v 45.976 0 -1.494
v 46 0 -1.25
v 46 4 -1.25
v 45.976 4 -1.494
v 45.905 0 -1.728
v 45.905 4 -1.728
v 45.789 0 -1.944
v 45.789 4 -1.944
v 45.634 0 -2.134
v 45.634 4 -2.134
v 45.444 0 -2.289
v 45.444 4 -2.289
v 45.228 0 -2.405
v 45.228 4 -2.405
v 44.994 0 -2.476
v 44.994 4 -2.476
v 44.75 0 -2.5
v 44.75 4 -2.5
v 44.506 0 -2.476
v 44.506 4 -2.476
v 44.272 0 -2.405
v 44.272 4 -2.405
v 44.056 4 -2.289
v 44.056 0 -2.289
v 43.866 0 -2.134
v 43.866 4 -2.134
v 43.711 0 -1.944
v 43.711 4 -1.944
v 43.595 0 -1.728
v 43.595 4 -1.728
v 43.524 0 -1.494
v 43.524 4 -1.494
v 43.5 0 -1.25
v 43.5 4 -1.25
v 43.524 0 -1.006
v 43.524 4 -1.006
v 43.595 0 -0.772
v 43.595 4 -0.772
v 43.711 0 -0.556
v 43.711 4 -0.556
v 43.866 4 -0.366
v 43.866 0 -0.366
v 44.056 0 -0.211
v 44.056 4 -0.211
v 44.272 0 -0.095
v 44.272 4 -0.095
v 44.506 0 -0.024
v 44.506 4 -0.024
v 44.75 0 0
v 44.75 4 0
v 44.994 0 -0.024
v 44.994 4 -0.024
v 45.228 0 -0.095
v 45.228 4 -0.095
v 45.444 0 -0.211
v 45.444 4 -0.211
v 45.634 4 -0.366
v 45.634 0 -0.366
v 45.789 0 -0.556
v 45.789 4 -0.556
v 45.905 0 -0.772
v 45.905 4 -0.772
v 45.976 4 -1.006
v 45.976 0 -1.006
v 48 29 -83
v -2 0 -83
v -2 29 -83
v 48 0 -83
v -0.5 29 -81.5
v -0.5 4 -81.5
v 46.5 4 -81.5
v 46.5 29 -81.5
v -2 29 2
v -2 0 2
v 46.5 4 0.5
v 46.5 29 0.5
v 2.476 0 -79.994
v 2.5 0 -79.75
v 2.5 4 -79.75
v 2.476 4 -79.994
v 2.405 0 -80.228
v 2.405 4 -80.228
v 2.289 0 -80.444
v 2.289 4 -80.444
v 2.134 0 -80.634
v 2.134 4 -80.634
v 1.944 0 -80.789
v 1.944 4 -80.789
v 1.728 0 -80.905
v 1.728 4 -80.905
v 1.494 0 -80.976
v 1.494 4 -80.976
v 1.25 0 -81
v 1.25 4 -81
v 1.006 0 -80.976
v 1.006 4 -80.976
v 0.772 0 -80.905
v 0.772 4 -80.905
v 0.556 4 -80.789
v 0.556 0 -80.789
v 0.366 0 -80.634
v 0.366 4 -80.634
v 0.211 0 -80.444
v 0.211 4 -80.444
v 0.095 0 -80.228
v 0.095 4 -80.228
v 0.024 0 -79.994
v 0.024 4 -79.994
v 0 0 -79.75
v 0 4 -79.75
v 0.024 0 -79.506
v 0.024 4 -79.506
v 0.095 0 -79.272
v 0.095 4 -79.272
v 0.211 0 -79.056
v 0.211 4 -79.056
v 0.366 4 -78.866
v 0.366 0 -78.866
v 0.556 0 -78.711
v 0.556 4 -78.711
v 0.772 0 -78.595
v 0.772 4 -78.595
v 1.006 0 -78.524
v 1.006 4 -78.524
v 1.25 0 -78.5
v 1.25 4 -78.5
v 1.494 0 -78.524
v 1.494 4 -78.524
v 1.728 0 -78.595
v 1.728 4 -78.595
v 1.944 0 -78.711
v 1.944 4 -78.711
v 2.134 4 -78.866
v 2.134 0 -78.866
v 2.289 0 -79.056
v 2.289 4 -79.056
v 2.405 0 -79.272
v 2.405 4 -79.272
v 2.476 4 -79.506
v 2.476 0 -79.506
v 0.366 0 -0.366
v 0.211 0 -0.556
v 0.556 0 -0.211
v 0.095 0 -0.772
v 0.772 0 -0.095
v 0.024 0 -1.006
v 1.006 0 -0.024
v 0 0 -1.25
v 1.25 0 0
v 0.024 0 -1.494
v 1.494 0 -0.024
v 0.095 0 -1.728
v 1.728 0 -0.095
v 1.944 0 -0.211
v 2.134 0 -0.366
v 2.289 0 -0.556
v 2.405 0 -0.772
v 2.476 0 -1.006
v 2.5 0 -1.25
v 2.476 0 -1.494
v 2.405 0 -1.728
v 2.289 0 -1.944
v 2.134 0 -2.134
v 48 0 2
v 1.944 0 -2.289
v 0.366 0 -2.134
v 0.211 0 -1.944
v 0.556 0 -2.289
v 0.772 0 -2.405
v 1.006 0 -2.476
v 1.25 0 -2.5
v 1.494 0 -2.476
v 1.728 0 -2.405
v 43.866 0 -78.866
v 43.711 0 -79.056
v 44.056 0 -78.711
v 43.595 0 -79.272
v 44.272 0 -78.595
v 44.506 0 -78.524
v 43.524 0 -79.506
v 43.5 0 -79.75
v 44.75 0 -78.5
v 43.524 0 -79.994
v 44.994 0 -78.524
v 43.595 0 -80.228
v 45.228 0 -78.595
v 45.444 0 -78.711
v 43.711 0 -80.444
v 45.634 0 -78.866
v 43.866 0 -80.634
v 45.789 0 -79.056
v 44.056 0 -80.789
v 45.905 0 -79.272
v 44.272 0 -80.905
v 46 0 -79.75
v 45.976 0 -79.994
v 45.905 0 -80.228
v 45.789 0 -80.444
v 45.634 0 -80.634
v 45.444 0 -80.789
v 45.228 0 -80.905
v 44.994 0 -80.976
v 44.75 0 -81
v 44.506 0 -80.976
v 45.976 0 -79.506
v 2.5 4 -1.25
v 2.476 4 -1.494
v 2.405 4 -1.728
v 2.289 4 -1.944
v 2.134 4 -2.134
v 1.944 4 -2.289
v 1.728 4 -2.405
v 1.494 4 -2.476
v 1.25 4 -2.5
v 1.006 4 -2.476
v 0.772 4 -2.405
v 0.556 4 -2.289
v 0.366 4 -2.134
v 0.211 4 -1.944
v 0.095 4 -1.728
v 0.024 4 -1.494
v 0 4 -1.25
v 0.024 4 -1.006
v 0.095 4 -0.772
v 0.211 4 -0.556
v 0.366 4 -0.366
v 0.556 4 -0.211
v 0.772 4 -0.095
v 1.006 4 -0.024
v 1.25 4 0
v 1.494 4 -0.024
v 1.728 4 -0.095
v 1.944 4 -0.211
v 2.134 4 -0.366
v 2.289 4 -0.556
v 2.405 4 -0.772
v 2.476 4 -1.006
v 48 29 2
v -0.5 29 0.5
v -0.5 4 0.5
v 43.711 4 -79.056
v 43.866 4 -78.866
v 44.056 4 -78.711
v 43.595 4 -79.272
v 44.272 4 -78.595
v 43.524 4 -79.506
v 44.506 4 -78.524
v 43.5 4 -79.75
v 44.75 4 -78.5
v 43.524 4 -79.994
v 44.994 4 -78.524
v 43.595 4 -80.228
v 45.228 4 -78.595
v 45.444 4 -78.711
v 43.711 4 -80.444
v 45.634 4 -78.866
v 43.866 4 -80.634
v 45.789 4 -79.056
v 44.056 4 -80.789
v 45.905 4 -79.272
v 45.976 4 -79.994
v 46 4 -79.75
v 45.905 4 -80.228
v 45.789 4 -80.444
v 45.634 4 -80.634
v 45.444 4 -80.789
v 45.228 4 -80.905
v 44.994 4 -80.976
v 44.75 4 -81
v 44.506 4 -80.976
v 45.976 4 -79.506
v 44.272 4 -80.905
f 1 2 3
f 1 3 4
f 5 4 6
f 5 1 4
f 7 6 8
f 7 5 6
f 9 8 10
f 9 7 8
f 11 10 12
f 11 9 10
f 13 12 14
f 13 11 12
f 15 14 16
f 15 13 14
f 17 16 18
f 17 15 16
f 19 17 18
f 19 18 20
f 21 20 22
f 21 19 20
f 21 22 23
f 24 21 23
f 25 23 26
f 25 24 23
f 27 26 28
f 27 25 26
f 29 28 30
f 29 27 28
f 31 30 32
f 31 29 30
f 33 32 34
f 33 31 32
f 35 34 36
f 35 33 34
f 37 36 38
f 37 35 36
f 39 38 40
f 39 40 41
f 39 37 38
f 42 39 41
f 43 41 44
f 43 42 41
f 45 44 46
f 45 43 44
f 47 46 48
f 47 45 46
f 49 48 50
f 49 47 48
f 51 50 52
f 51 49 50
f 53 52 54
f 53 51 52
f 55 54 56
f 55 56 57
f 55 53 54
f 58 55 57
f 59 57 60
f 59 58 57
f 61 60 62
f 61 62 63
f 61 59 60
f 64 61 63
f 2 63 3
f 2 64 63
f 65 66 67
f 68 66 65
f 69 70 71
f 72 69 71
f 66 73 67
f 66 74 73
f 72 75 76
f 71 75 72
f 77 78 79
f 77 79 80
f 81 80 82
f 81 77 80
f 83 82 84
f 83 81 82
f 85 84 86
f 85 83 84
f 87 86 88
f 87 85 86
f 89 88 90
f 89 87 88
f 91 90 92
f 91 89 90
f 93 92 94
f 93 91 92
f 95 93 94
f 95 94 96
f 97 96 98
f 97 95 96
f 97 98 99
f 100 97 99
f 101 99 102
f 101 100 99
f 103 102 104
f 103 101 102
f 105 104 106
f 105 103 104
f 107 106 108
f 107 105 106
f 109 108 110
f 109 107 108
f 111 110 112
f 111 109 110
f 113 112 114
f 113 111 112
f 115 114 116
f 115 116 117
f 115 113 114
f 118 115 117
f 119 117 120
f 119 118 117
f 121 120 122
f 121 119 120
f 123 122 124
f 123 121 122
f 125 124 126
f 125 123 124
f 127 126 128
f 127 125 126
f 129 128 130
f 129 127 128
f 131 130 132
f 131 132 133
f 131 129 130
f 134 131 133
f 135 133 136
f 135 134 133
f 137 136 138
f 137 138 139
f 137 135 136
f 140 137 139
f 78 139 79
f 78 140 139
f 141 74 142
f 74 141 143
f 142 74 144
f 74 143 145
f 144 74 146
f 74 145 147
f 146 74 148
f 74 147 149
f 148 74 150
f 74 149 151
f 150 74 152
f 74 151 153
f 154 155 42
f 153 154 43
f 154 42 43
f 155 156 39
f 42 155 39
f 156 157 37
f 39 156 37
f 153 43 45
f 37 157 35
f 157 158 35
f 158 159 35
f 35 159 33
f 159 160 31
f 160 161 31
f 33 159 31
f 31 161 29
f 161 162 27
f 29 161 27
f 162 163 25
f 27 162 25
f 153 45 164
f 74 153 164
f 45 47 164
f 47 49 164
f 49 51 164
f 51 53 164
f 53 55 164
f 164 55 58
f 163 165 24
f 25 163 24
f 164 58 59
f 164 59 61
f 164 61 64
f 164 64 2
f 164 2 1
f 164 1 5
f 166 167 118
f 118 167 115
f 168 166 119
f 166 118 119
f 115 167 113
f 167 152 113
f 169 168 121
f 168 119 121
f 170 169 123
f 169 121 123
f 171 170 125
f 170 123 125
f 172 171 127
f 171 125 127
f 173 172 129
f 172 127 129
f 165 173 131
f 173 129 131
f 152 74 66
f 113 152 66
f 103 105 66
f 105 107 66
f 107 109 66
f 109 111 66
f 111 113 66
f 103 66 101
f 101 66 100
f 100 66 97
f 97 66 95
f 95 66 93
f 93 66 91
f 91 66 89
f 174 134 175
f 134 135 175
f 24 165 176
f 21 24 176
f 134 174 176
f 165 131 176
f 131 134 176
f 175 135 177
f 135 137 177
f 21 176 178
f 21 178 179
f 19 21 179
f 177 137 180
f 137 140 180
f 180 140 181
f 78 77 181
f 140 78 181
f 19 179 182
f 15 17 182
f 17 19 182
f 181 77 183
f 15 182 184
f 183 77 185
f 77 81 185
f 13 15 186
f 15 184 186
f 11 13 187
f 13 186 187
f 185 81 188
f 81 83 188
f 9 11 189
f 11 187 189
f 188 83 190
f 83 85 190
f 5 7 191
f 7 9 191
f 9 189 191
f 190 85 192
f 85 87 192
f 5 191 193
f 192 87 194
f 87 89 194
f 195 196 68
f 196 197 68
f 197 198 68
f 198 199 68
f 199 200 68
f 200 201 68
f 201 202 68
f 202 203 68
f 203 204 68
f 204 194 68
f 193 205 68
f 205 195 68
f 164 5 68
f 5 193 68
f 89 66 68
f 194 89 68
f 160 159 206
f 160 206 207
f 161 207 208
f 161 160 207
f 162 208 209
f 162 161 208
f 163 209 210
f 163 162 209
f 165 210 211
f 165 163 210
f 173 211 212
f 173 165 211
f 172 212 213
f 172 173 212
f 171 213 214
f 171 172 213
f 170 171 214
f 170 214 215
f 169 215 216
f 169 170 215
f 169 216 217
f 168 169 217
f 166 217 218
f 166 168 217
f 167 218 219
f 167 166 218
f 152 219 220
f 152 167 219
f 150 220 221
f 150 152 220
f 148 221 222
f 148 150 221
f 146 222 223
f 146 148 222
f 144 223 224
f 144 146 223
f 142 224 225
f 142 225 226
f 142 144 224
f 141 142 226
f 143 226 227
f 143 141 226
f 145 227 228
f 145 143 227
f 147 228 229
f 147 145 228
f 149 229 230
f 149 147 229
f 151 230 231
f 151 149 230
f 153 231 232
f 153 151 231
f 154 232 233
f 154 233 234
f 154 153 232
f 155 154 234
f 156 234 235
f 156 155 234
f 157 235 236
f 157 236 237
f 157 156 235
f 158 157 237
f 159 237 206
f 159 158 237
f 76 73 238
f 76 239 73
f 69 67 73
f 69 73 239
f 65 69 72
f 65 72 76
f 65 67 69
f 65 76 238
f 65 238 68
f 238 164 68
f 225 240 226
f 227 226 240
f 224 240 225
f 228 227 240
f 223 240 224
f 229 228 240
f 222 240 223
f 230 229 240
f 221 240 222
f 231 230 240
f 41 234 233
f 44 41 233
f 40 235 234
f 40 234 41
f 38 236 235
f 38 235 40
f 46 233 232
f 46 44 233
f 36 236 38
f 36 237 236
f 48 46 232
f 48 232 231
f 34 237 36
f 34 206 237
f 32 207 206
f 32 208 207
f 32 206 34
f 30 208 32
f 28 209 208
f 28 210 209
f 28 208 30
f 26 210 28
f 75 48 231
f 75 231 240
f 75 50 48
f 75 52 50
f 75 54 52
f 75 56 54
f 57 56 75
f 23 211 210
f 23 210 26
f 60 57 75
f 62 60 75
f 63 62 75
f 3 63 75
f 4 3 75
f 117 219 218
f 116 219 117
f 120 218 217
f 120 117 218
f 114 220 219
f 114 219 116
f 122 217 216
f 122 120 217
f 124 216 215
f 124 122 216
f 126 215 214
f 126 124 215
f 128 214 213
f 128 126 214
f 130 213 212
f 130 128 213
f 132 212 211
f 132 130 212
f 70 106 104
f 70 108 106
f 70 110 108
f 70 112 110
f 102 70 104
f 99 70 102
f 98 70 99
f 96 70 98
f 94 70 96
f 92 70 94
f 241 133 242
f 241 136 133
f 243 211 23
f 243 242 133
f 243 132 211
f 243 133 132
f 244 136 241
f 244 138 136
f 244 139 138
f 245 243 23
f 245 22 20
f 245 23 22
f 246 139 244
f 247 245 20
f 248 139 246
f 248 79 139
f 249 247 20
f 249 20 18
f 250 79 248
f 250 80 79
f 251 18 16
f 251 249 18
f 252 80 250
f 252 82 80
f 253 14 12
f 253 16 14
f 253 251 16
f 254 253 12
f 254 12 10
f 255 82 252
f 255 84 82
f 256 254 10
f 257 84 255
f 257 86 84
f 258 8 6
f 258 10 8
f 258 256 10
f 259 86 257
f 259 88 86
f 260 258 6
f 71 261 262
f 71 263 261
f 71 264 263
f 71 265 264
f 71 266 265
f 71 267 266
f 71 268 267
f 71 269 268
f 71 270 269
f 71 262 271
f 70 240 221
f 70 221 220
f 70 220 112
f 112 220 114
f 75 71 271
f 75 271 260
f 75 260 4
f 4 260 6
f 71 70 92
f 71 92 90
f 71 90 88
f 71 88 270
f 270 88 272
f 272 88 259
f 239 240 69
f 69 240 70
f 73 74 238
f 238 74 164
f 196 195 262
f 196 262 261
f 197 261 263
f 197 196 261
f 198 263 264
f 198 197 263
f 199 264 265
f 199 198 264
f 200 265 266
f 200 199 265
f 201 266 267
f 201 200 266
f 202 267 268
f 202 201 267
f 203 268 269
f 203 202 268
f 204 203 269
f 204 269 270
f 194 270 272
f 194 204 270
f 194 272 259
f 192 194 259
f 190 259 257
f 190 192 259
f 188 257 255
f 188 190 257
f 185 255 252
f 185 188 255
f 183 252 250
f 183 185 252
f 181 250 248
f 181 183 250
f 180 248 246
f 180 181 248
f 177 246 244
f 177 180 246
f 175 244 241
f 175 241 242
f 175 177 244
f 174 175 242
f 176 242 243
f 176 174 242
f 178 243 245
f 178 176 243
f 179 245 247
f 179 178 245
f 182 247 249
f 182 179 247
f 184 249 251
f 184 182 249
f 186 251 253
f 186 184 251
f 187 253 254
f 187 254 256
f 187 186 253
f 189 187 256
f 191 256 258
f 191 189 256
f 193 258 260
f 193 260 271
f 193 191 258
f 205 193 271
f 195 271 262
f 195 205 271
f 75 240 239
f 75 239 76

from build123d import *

# Parameters (mm, degrees)
SKETCH1_W           = 50
SKETCH1_H           = 85
SKETCH1_R           = 1.25
BOSS_EXTRUDE3_DEPTH = 4
SKETCH2_W           = 50
SKETCH2_H           = 85
SKETCH2_W_2         = 47
SKETCH2_H_2         = 82
BOSS_EXTRUDE4_DEPTH = 25


with BuildPart() as part:
    # Sketch1 → Boss-Extrude3 (new body)
    with BuildSketch(Plane(origin=(0, 0, 0), x_dir=(1, 0, 0), z_dir=(0, 1, 0))):
        with Locations((23, 40.5)):
            Rectangle(SKETCH1_W, SKETCH1_H)
        with Locations((1.25, 79.75)):
            Circle(SKETCH1_R, mode=Mode.SUBTRACT)
        with Locations((44.75, 79.75)):
            Circle(SKETCH1_R, mode=Mode.SUBTRACT)
        with Locations((44.75, 1.25)):
            Circle(SKETCH1_R, mode=Mode.SUBTRACT)
        with Locations((1.25, 1.25)):
            Circle(SKETCH1_R, mode=Mode.SUBTRACT)
    extrude(amount=BOSS_EXTRUDE3_DEPTH)

    # Sketch2 → Boss-Extrude4 (add)
    with BuildSketch(Plane(origin=(0, 4, 0), x_dir=(1, 0, 0), z_dir=(0, 1, 0))):
        with Locations((23, 40.5)):
            Rectangle(SKETCH2_W, SKETCH2_H)
        with Locations((23, 40.5)):
            Rectangle(SKETCH2_W_2, SKETCH2_H_2, mode=Mode.SUBTRACT)
    extrude(amount=BOSS_EXTRUDE4_DEPTH)


solid = part.part
